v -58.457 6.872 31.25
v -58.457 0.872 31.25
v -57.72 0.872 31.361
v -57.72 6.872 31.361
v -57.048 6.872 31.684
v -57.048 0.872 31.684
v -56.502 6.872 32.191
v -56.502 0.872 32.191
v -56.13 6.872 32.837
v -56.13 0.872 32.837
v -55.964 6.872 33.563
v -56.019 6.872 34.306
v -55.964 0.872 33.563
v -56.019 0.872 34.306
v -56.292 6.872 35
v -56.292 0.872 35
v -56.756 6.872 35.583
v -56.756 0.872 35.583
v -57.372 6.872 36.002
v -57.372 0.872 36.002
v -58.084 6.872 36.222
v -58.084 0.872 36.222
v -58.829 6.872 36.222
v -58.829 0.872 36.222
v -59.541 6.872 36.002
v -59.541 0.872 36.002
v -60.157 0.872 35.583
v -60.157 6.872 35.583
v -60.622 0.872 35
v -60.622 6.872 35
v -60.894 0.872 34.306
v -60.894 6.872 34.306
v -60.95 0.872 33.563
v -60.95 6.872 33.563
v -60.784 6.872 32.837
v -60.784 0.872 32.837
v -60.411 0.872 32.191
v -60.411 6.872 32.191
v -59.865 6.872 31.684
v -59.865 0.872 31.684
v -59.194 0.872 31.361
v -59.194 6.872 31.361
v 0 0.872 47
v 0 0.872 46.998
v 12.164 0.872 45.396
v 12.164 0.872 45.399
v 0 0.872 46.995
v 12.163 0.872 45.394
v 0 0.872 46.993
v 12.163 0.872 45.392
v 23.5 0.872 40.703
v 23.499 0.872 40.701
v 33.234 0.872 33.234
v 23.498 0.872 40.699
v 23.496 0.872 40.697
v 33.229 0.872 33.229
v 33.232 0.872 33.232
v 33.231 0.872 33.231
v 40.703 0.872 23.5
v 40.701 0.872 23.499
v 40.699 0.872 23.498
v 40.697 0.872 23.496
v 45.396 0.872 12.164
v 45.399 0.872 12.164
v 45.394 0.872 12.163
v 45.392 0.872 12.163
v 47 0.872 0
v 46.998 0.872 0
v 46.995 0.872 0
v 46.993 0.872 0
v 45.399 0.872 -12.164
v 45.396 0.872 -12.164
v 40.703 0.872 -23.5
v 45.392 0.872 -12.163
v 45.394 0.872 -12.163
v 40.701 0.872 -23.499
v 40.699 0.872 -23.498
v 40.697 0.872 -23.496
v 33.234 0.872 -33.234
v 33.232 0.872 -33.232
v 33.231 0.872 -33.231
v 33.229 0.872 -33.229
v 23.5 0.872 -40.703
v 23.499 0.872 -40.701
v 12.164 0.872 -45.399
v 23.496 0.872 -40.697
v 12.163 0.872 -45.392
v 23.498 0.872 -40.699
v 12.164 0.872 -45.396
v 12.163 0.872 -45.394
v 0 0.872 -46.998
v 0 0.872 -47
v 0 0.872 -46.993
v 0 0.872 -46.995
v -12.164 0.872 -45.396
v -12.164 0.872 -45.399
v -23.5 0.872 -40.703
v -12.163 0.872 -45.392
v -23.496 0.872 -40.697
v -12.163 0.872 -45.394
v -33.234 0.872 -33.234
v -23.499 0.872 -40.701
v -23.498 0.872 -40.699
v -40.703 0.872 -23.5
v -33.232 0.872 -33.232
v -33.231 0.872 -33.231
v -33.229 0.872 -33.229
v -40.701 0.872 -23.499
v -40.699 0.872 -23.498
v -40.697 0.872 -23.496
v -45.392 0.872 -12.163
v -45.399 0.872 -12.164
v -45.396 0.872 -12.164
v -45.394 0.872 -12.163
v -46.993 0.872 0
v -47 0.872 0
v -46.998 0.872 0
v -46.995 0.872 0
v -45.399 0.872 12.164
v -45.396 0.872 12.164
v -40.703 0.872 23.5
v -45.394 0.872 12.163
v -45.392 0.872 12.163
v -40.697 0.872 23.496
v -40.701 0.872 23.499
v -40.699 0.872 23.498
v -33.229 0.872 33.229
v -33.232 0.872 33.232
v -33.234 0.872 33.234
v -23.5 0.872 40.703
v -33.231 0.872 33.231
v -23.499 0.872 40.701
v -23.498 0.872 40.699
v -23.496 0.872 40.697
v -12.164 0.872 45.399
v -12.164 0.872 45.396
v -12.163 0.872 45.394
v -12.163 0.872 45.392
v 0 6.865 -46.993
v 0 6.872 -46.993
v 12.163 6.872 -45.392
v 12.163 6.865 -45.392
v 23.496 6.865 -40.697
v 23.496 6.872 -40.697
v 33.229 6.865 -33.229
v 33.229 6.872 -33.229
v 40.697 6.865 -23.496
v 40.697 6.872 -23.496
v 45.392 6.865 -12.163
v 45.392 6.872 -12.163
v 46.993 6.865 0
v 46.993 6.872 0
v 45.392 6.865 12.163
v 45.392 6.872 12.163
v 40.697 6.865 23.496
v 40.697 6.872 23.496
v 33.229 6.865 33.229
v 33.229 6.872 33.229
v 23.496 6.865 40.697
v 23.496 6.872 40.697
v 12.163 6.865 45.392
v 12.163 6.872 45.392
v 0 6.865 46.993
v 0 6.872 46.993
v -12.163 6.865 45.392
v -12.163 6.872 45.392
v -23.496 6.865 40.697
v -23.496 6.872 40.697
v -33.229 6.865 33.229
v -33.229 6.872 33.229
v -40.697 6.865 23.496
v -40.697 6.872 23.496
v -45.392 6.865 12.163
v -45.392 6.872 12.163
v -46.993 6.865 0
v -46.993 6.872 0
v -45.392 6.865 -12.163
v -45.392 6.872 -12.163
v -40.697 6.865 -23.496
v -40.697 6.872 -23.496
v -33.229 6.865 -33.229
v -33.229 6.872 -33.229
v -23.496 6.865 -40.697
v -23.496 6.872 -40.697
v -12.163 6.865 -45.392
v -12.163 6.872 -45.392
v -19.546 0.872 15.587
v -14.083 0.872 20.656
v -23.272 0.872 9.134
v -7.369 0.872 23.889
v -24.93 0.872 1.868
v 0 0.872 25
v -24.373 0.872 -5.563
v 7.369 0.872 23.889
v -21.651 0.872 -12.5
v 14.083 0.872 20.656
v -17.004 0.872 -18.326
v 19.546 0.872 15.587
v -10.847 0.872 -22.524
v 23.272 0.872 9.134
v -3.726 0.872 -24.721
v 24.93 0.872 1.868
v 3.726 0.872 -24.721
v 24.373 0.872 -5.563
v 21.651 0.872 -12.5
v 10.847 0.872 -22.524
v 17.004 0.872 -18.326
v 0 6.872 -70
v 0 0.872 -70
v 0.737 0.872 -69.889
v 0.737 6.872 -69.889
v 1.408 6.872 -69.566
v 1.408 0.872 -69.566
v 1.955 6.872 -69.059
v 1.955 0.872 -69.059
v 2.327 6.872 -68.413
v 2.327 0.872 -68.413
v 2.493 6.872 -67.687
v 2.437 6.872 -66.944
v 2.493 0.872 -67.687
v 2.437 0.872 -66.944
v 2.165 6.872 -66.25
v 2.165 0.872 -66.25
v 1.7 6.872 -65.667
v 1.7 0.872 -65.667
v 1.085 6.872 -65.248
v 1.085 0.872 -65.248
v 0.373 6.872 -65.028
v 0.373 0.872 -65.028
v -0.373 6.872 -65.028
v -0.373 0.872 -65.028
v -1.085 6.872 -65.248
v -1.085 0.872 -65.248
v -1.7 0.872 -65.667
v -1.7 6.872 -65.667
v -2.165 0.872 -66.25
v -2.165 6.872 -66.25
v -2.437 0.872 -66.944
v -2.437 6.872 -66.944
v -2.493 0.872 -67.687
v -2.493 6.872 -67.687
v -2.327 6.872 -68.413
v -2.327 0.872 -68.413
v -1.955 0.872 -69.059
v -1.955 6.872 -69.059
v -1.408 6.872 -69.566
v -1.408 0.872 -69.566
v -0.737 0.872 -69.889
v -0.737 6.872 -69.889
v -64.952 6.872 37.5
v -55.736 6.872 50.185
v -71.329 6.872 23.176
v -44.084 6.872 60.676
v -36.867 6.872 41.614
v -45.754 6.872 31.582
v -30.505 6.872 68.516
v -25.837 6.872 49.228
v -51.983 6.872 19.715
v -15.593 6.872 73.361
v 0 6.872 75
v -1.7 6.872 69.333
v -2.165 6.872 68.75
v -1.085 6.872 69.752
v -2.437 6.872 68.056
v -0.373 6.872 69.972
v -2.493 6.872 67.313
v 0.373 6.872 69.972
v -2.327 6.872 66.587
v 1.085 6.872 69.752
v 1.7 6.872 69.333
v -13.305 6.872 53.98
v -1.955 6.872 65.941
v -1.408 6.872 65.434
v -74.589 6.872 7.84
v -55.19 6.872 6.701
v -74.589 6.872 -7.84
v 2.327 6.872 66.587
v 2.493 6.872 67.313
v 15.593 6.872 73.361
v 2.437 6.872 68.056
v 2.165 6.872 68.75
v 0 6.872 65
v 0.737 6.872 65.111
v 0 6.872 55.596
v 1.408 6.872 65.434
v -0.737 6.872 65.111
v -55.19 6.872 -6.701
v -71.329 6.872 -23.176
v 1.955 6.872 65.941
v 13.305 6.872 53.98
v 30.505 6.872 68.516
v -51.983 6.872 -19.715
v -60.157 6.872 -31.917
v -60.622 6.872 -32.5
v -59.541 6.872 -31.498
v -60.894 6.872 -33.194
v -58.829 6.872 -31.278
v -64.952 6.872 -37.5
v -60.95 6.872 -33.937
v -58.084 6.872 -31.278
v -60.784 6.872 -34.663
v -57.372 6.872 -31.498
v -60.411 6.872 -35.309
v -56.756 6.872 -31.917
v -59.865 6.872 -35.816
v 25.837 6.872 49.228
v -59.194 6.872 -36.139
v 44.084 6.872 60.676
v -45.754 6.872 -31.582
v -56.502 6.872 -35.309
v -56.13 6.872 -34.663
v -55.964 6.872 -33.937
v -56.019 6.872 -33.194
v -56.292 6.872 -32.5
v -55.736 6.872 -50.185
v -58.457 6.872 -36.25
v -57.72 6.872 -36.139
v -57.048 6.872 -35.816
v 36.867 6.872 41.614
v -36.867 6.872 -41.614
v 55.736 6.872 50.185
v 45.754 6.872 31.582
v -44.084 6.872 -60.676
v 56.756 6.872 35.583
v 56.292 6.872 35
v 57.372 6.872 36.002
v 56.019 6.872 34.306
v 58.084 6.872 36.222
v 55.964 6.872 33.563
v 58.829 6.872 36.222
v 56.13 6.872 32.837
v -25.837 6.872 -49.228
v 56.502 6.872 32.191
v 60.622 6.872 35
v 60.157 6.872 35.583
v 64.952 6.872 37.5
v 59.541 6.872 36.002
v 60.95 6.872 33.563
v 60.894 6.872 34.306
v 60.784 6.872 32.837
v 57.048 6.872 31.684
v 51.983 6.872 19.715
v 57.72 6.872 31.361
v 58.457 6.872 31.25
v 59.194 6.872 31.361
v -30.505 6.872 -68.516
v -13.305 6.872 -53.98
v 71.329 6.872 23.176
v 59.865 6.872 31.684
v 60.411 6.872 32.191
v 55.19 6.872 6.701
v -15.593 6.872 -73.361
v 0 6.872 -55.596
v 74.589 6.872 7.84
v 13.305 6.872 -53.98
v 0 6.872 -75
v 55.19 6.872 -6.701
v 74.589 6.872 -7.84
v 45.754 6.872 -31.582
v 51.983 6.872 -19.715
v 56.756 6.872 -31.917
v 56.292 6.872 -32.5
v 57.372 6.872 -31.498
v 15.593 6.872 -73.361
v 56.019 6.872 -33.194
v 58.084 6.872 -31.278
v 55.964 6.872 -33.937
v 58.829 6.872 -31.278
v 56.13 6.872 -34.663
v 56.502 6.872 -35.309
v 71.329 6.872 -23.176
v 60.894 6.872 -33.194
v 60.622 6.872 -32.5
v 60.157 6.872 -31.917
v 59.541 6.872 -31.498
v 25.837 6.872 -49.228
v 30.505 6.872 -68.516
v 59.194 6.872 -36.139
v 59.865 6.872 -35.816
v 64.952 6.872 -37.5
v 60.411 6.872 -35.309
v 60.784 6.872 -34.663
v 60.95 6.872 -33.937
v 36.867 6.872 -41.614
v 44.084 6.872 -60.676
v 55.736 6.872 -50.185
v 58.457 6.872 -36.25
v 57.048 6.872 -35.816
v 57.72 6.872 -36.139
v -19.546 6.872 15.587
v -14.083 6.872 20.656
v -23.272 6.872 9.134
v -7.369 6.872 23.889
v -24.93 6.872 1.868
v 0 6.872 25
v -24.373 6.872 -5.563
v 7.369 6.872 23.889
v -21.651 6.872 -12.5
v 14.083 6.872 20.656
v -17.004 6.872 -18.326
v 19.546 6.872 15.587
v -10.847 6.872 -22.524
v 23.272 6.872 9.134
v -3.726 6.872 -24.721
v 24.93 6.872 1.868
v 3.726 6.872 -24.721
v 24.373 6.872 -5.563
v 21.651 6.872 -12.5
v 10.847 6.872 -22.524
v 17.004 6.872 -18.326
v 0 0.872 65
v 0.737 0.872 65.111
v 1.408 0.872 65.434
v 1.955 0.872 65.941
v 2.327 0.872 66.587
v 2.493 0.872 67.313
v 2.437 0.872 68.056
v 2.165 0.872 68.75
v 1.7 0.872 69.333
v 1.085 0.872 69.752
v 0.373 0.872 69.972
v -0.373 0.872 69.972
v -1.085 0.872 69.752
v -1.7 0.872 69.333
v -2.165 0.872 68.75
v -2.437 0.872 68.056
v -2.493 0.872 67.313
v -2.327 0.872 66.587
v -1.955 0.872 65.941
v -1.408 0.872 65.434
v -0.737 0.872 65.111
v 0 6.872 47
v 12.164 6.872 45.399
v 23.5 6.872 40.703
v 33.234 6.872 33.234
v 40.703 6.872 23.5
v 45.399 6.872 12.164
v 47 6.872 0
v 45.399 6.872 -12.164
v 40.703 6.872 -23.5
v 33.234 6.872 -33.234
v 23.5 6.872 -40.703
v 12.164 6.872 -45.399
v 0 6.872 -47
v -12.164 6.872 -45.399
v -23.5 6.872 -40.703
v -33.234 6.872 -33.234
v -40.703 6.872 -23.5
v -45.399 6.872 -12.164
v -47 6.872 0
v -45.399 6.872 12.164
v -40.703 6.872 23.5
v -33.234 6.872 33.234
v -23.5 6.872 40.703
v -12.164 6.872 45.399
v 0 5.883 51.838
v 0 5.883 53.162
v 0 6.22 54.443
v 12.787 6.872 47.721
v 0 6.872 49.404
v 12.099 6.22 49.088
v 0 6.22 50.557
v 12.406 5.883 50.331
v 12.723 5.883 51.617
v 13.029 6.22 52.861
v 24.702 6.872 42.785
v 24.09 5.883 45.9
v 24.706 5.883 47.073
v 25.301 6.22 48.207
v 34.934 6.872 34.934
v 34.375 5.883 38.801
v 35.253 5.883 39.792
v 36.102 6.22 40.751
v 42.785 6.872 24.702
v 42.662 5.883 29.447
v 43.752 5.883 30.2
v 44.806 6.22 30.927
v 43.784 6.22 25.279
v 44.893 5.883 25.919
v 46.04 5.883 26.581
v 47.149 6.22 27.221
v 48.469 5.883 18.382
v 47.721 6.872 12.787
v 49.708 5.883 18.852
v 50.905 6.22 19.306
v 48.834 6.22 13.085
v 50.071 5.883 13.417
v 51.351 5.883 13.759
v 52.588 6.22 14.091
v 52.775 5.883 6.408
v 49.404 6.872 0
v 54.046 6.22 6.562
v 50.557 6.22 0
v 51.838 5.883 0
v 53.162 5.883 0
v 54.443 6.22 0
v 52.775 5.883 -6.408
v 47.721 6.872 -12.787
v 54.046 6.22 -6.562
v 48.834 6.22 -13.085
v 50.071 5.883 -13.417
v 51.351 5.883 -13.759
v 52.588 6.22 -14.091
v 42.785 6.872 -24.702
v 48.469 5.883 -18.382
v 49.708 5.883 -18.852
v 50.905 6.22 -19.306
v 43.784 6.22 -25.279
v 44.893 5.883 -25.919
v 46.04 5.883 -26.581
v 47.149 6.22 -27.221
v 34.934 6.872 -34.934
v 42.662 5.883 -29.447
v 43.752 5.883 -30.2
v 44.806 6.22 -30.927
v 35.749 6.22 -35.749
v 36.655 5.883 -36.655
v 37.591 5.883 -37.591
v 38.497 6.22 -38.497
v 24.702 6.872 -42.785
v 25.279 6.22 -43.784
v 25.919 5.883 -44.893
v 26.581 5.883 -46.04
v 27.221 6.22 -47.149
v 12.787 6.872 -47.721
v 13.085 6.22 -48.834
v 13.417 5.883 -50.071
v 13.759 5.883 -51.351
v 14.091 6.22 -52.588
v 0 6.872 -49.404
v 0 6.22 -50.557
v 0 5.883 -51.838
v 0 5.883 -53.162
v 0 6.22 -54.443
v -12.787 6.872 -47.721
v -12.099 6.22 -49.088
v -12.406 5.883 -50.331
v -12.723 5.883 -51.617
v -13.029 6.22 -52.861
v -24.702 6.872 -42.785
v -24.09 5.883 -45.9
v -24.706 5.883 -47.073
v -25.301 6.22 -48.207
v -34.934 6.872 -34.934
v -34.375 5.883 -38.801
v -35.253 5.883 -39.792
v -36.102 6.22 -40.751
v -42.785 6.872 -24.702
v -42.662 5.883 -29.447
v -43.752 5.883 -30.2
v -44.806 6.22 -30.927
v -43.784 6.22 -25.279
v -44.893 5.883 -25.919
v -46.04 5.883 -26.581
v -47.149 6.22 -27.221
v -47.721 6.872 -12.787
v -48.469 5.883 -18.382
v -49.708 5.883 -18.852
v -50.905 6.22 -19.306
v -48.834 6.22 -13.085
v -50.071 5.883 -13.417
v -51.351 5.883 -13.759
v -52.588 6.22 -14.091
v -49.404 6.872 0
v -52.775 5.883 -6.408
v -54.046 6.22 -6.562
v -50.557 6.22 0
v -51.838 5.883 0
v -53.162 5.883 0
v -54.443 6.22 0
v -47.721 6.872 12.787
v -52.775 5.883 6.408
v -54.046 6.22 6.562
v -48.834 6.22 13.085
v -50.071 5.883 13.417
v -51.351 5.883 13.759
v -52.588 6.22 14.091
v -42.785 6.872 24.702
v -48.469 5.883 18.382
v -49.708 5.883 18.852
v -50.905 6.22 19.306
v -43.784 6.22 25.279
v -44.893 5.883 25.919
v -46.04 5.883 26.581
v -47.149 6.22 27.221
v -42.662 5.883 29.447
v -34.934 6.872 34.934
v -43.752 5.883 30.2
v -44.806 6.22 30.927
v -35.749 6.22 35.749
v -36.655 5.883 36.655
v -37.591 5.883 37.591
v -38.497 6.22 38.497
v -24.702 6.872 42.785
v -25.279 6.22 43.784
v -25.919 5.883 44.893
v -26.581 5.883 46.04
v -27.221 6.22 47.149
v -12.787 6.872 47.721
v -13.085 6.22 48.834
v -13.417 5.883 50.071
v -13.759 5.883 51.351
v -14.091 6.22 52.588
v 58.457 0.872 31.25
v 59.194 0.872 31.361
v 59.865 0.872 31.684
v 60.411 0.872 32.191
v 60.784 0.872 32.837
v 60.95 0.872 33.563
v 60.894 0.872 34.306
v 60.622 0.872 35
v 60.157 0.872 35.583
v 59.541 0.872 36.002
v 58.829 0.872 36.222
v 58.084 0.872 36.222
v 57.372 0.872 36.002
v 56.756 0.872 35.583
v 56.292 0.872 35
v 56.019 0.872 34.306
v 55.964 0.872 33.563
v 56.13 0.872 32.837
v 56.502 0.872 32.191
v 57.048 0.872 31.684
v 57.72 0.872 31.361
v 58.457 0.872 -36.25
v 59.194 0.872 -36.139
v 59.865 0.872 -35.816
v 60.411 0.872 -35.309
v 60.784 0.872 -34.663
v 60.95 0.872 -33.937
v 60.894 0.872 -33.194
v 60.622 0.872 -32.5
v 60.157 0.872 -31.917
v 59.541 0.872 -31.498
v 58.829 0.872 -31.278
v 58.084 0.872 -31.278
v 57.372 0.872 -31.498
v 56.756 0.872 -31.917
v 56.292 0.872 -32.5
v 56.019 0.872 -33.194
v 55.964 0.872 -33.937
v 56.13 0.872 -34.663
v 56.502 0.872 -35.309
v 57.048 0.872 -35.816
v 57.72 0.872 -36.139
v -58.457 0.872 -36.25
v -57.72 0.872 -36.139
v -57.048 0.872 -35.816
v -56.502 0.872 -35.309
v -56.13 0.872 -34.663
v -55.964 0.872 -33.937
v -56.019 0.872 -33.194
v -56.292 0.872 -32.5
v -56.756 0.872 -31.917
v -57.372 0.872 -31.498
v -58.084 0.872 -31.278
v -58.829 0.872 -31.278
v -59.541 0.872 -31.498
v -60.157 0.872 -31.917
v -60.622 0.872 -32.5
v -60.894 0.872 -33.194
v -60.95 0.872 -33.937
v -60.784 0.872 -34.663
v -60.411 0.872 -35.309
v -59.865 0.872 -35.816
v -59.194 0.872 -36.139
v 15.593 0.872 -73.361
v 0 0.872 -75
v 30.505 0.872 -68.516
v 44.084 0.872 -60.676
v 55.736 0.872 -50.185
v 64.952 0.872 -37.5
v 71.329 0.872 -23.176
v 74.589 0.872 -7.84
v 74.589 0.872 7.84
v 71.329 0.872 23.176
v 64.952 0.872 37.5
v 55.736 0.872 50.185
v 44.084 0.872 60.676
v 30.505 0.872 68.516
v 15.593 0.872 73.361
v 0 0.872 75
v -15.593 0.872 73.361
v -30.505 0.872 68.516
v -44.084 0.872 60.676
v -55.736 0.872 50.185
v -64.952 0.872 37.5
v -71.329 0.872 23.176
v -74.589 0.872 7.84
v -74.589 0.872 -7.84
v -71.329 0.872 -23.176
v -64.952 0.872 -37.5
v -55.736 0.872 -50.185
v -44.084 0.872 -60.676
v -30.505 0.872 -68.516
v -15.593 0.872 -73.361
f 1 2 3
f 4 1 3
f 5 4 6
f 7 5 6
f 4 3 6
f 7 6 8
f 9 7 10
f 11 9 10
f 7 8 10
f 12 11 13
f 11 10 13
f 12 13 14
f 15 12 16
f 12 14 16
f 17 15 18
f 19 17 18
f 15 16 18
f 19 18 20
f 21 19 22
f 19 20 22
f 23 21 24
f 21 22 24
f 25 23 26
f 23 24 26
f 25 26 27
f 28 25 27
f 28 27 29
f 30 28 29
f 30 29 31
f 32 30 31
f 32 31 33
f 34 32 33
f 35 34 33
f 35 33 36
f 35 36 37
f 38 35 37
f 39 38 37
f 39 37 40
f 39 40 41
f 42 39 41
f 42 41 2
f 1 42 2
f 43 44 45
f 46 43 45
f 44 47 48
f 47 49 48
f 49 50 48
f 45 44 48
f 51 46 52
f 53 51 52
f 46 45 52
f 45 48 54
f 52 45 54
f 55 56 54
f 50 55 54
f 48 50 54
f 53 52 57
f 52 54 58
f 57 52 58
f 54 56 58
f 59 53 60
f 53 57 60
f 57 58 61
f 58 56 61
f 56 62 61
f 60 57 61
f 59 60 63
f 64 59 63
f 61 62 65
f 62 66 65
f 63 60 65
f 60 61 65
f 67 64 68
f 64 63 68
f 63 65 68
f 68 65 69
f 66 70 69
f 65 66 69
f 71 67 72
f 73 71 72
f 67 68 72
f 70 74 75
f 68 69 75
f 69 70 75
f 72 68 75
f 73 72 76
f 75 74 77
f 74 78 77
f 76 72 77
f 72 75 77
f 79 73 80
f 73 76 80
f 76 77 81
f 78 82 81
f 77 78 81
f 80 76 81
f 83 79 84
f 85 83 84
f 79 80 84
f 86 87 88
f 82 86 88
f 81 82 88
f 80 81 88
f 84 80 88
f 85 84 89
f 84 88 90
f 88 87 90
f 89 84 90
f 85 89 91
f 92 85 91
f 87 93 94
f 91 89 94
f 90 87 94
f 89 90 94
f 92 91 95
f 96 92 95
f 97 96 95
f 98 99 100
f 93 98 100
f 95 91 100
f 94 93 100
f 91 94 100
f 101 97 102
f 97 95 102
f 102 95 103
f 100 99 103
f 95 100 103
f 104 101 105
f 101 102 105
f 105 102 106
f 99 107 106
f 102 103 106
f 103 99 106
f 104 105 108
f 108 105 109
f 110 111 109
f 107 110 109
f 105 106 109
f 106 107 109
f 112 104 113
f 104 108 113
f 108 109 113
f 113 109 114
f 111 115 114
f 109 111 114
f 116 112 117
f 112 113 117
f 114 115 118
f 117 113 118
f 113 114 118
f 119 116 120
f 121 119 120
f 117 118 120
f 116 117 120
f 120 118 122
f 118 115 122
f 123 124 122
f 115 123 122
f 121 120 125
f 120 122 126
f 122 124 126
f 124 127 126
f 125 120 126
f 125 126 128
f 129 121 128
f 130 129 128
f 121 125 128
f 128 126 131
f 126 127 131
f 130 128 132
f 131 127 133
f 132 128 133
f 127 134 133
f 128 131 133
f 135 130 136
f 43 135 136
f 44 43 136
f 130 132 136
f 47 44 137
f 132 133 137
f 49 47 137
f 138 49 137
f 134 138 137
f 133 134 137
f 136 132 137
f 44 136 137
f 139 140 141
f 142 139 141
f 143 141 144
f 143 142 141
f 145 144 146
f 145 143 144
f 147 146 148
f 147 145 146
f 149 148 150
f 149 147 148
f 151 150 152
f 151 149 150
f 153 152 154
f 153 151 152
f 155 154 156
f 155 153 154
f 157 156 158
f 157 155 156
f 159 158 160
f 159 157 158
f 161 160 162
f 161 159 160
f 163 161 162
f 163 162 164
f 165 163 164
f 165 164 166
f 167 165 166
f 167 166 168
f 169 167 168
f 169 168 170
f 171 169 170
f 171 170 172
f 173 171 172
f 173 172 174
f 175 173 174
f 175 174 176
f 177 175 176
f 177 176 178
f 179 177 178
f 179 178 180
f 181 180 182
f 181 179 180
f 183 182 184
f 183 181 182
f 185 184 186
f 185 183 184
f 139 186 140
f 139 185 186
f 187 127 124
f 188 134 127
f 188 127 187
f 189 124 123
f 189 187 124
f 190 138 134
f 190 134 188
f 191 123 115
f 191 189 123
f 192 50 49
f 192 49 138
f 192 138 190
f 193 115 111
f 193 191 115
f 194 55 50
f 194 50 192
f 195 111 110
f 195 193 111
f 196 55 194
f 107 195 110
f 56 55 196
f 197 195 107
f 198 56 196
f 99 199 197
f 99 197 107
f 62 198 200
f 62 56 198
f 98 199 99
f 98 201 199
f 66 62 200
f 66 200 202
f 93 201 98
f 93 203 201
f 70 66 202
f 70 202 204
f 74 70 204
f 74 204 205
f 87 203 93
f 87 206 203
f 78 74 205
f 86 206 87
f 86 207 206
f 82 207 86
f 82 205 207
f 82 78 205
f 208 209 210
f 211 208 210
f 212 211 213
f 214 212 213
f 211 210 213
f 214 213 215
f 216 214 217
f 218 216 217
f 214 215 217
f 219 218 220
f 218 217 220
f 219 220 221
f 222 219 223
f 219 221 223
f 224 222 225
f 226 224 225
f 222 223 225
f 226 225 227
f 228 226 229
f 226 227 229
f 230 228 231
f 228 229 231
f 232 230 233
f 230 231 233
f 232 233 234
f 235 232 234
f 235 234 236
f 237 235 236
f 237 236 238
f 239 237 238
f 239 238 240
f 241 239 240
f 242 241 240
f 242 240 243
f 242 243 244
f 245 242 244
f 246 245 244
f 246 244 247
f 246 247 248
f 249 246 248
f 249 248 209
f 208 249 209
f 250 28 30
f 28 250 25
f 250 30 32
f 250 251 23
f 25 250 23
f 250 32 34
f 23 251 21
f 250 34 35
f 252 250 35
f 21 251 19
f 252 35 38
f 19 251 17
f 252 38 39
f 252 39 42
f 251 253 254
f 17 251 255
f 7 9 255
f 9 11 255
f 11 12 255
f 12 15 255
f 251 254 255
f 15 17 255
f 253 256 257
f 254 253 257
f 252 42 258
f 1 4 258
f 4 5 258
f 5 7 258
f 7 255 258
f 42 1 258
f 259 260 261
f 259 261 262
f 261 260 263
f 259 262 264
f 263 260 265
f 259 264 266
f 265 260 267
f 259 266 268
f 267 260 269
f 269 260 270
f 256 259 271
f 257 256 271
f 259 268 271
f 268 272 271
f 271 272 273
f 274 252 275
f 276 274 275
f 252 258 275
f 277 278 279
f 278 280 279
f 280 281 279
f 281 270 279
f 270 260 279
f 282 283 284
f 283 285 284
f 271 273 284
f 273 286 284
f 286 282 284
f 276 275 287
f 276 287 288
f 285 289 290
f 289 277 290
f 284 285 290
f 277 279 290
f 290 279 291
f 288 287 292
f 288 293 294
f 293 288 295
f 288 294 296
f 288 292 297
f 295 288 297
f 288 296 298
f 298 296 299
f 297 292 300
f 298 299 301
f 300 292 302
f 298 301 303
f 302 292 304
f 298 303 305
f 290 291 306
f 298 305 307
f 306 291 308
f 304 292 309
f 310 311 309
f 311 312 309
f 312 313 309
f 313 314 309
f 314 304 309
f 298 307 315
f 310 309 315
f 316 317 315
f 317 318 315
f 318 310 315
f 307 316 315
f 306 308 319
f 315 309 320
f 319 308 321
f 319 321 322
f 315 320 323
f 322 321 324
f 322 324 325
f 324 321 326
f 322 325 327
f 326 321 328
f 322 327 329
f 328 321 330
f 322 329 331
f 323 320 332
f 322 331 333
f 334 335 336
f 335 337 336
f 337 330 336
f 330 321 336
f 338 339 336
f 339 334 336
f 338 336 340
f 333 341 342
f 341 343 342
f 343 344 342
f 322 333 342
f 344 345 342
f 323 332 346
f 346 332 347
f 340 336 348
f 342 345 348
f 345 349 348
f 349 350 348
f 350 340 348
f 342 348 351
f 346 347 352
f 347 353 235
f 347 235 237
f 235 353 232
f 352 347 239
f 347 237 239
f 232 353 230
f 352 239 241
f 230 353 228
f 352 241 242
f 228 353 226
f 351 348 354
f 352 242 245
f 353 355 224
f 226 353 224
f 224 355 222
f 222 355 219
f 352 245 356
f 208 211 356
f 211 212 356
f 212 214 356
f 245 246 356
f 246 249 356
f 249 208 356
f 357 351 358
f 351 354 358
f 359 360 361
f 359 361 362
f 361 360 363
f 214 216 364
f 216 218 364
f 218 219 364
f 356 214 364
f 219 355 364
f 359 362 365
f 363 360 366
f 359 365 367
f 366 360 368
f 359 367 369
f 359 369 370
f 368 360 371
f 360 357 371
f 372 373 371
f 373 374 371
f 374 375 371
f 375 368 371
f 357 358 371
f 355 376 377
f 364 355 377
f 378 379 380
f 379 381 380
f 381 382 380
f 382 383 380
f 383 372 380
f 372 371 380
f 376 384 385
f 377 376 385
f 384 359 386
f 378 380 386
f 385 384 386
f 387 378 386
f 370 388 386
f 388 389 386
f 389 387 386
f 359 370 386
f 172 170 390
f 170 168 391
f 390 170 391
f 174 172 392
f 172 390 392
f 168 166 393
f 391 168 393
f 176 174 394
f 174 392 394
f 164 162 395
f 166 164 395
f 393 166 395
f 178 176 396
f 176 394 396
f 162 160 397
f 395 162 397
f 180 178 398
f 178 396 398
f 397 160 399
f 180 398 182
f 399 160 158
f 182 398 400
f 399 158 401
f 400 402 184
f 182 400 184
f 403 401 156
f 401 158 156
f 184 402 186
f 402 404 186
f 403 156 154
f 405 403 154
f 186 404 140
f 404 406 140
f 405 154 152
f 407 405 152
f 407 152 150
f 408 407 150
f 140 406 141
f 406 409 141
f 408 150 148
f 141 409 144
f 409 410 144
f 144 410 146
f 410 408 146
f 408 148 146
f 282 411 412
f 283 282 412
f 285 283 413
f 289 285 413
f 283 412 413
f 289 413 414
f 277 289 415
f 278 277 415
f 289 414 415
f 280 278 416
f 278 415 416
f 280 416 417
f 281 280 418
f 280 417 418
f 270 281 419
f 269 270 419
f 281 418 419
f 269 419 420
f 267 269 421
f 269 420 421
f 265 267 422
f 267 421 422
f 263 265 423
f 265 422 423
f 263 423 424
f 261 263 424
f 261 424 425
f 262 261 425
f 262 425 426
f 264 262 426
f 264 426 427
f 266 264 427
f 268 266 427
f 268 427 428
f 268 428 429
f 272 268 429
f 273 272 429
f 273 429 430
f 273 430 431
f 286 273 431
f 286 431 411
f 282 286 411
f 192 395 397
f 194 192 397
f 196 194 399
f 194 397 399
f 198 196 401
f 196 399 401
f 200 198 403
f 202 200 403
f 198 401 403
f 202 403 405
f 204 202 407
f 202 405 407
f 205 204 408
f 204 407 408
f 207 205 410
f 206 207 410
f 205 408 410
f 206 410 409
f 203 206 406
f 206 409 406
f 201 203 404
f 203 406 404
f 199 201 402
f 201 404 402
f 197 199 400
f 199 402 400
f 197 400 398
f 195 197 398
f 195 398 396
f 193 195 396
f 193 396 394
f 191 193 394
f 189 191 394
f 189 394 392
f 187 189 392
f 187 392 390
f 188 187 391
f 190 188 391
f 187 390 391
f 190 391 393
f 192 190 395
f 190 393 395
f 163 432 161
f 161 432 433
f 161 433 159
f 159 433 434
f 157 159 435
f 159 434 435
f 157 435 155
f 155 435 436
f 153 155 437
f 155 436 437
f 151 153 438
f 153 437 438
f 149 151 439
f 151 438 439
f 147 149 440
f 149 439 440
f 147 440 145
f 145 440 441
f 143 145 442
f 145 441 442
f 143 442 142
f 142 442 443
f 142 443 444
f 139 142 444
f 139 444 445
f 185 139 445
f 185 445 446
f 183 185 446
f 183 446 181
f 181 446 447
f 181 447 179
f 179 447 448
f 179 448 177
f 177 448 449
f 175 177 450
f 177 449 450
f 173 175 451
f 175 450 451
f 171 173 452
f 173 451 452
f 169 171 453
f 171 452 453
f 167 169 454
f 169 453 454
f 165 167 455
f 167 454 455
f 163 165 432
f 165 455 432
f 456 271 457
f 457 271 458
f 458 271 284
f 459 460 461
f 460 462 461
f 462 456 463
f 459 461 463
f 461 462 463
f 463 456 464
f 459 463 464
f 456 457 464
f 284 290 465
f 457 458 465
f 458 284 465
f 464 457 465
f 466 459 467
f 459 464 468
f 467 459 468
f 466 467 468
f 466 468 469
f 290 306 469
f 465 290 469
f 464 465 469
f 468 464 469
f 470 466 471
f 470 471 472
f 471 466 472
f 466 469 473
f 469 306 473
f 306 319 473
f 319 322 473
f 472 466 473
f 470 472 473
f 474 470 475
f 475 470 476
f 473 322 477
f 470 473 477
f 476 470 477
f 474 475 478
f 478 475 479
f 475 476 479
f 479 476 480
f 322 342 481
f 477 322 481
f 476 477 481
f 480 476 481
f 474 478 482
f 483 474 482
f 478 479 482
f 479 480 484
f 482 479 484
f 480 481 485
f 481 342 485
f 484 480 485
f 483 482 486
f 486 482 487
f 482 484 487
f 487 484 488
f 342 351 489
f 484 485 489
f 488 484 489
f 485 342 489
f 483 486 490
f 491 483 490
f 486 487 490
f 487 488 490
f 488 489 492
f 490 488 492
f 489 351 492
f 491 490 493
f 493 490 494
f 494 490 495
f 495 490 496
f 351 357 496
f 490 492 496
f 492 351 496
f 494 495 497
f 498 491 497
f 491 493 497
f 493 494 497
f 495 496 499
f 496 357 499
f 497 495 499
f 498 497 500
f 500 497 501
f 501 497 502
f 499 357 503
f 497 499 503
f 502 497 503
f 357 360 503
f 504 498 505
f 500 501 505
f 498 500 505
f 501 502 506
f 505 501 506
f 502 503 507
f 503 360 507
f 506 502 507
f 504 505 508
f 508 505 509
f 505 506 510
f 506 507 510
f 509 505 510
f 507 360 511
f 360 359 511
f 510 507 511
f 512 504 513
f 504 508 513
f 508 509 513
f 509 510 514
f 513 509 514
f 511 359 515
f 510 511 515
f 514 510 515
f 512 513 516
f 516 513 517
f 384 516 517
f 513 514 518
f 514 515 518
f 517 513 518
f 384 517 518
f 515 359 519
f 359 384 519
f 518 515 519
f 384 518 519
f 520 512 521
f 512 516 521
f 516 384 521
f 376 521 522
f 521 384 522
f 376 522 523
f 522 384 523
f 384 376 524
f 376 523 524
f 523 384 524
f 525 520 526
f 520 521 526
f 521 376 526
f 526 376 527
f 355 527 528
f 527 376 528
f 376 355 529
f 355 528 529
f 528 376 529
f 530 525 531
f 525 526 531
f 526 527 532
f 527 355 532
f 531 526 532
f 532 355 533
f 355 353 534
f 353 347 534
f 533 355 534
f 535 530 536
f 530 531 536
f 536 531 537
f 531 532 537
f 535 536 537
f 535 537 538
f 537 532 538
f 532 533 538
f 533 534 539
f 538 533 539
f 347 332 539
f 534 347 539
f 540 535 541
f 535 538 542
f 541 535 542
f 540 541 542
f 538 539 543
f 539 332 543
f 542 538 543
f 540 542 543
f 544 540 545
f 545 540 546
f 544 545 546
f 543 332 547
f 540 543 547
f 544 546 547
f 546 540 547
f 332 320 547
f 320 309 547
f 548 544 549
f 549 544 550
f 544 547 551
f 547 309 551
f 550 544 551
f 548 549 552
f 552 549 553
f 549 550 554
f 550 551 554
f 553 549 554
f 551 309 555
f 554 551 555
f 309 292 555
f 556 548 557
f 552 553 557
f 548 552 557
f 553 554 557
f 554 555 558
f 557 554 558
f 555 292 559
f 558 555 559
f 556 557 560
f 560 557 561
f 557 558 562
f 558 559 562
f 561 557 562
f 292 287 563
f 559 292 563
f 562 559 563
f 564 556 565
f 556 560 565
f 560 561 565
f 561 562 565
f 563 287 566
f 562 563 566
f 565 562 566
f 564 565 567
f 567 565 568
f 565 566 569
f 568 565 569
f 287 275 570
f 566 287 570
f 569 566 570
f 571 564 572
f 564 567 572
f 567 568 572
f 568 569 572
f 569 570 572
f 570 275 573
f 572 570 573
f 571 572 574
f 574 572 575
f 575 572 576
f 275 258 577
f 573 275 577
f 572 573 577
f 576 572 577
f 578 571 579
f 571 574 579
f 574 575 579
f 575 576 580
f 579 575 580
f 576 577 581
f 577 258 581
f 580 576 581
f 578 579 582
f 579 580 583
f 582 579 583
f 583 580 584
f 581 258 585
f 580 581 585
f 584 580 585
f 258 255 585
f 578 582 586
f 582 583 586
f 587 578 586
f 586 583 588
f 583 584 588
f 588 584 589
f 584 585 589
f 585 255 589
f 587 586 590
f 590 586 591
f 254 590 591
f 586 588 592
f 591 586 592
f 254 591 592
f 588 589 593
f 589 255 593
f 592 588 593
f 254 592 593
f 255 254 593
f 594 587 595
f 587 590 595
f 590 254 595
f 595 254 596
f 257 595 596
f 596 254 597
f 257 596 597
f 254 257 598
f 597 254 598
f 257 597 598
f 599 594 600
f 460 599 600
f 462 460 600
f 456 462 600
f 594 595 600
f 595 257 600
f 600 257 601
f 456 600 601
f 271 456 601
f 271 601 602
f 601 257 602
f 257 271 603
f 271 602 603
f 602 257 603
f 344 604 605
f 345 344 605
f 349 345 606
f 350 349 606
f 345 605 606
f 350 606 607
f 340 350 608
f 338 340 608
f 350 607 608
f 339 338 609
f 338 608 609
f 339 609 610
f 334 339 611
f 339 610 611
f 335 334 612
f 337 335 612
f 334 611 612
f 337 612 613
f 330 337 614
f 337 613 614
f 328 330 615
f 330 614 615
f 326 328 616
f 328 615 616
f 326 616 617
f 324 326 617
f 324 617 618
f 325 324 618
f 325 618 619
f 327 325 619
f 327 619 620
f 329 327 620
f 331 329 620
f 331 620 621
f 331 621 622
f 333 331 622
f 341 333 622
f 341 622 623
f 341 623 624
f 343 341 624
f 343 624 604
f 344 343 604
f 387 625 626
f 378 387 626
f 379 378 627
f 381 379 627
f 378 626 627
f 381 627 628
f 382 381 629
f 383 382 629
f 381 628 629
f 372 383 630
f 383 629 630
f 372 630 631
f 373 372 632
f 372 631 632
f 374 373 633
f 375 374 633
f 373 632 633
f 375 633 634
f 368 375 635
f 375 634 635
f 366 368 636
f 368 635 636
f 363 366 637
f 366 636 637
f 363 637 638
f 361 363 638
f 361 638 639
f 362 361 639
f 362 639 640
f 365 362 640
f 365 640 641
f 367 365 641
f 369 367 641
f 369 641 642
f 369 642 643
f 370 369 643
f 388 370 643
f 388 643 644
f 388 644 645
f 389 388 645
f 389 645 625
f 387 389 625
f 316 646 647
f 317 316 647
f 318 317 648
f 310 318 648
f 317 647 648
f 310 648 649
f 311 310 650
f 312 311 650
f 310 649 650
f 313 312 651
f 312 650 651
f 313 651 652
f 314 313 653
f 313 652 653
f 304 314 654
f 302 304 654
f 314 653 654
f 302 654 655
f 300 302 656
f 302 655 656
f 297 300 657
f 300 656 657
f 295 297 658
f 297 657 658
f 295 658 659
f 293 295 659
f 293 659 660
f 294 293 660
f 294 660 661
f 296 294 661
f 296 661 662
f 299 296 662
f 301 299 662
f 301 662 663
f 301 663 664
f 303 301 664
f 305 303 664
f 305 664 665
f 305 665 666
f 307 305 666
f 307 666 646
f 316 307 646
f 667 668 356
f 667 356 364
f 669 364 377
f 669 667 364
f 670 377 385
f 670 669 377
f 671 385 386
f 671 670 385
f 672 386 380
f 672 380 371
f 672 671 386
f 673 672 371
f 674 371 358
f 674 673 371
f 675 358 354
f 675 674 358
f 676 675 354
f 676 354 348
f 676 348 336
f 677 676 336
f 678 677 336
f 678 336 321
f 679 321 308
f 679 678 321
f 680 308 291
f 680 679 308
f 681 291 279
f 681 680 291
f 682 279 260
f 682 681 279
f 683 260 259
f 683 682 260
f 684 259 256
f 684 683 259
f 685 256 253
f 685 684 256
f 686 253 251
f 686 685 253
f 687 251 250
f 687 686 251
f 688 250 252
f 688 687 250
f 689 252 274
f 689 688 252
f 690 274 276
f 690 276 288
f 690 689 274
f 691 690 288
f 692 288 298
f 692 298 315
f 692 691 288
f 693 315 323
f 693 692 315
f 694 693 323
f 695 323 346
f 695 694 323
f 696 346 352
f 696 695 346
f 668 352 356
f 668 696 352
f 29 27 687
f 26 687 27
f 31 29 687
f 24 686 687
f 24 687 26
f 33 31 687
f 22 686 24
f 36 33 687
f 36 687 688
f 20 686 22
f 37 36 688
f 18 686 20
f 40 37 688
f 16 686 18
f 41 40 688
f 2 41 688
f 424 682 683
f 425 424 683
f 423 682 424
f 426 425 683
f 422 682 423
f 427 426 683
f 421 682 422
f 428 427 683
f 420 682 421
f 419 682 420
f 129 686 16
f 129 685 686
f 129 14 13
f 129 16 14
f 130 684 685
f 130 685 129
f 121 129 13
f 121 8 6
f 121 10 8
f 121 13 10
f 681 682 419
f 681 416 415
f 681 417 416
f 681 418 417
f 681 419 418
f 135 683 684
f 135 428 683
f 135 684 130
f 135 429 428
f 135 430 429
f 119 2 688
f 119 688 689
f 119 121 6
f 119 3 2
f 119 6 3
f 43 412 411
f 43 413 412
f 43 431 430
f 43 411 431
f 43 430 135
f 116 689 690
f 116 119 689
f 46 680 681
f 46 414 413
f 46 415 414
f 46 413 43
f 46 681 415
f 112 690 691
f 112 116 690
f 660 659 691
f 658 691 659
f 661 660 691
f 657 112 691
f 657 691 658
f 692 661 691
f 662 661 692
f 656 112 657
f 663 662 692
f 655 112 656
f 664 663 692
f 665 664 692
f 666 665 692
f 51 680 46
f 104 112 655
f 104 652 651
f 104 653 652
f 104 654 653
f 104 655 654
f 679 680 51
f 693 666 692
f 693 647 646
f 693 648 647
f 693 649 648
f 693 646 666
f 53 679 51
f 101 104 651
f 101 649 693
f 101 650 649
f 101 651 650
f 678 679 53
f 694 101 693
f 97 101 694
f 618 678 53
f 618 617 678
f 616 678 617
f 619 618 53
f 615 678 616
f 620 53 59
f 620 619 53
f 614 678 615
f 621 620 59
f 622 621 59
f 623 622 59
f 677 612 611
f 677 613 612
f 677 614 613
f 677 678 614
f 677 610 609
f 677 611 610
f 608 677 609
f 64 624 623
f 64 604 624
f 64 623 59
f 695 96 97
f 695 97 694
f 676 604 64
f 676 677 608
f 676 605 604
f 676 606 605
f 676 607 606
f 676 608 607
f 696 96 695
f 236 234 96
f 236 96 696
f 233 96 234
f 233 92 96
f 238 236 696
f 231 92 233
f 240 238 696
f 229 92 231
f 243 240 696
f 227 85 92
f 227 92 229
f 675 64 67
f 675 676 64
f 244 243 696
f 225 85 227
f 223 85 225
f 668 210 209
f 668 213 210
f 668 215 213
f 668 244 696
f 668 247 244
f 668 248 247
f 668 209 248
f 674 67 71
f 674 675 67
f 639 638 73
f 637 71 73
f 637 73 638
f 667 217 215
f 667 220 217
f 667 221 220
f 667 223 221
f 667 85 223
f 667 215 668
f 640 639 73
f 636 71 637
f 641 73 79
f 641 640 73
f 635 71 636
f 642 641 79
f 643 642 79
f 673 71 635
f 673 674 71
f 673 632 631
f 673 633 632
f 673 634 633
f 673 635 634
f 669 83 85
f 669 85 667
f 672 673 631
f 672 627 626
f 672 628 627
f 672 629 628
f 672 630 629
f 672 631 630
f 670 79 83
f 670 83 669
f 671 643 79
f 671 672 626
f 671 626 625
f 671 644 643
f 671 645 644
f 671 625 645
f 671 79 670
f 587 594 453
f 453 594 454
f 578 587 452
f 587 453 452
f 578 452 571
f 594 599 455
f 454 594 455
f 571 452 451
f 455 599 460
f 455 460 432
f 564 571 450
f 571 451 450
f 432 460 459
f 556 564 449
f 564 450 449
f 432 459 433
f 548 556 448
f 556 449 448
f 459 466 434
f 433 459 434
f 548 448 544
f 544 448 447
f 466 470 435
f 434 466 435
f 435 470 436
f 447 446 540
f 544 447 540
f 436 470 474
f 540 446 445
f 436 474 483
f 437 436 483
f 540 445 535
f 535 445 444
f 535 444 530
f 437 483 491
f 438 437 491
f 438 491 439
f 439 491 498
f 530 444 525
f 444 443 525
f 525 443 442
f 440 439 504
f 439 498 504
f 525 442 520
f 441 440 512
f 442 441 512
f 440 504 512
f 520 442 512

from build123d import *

# Parameters (mm, degrees)
SKETCH2_R           = 75
SKETCH2_R_2         = 59
SKETCH2_R_3         = 46.992946112
BOSS_EXTRUDE1_DEPTH = 6
SKETCH8_R           = 25
CUT_EXTRUDE4_DEPTH  = 6
SKETCH9_R           = 2.5
CUT_EXTRUDE5_DEPTH  = 10


with BuildPart() as part:
    # Sketch1 → Revolve1 (revolve)
    with BuildSketch(Plane(origin=(0, 0, 0), x_dir=(-1, 0, 0), z_dir=(0, 0, -1)), mode=Mode.PRIVATE) as revolve1_sk:
        with BuildLine():
            Line((-59, 0.8724), (-47, 0.8724))
            ThreePointArc((-47, 0.8724), (-46.292893219, 1.165293219), (-46, 1.8724))
            Line((-46, 1.8724), (-46, 5.8724))
            Line((-46, 5.8724), (-47, 6.8724))
            Line((-47, 6.8724), (-49.4043, 6.8724))
            ThreePointArc((-49.4043, 6.8724), (-52.5, 5.8405), (-55.5957, 6.8724))
            Line((-55.5957, 6.8724), (-59, 6.8724))
            Line((-59, 6.8724), (-60, 5.8724))
            Line((-60, 5.8724), (-60, 1.8724))
            ThreePointArc((-60, 1.8724), (-59.707106781, 1.165293219), (-59, 0.8724))
        make_face()
    revolve(revolve1_sk.sketch.rotate(Axis((0, 0, 0), (0, 1, 0)), 270), axis=Axis((0, 0, 0), (0, 1, 0)))

    # Sketch2 → Boss-Extrude1 (add)
    # profile 1 of 2: a face of its own
    with BuildSketch(Plane.XZ.offset(-0.8724)):
        with Locations(Location((0, 0, 0), (0, 0, 270))):
            Circle(SKETCH2_R)
        Circle(SKETCH2_R_2, mode=Mode.SUBTRACT)
    # profile 2 of 2: a face of its own
    with BuildSketch(Plane.XZ.offset(-0.8724)):
        with Locations(Location((0, 0, 0), (0, 0, 270))):
            Circle(SKETCH2_R_3)
    extrude(amount=-BOSS_EXTRUDE1_DEPTH)

    # Sketch8 → Cut-Extrude4 (cut)
    with BuildSketch(Plane(origin=(0, 6.8724, 0), x_dir=(1, 0, 0), z_dir=(0, 1, 0))):
        with Locations(Location((0, 0, 0), (0, 0, 270))):
            Circle(SKETCH8_R)
    extrude(amount=-CUT_EXTRUDE4_DEPTH, mode=Mode.SUBTRACT)

    # Sketch9 → Cut-Extrude5 (cut)
    with BuildSketch(Plane.XZ.offset(-0.8724)):
        with Locations(Location((0, 67.5, 0), (0, 0, 270))):
            Circle(SKETCH9_R)
        with Locations(Location((58.456714755, 33.75, 0), (0, 0, 270))):
            Circle(SKETCH9_R)
        with Locations(Location((58.456714755, -33.75, 0), (0, 0, 270))):
            Circle(SKETCH9_R)
        with Locations(Location((0, -67.5, 0), (0, 0, 270))):
            Circle(SKETCH9_R)
        with Locations(Location((-58.456714755, -33.75, 0), (0, 0, 270))):
            Circle(SKETCH9_R)
        with Locations(Location((-58.456714755, 33.75, 0), (0, 0, 270))):
            Circle(SKETCH9_R)
    extrude(amount=-CUT_EXTRUDE5_DEPTH, mode=Mode.SUBTRACT)


solid = part.part
